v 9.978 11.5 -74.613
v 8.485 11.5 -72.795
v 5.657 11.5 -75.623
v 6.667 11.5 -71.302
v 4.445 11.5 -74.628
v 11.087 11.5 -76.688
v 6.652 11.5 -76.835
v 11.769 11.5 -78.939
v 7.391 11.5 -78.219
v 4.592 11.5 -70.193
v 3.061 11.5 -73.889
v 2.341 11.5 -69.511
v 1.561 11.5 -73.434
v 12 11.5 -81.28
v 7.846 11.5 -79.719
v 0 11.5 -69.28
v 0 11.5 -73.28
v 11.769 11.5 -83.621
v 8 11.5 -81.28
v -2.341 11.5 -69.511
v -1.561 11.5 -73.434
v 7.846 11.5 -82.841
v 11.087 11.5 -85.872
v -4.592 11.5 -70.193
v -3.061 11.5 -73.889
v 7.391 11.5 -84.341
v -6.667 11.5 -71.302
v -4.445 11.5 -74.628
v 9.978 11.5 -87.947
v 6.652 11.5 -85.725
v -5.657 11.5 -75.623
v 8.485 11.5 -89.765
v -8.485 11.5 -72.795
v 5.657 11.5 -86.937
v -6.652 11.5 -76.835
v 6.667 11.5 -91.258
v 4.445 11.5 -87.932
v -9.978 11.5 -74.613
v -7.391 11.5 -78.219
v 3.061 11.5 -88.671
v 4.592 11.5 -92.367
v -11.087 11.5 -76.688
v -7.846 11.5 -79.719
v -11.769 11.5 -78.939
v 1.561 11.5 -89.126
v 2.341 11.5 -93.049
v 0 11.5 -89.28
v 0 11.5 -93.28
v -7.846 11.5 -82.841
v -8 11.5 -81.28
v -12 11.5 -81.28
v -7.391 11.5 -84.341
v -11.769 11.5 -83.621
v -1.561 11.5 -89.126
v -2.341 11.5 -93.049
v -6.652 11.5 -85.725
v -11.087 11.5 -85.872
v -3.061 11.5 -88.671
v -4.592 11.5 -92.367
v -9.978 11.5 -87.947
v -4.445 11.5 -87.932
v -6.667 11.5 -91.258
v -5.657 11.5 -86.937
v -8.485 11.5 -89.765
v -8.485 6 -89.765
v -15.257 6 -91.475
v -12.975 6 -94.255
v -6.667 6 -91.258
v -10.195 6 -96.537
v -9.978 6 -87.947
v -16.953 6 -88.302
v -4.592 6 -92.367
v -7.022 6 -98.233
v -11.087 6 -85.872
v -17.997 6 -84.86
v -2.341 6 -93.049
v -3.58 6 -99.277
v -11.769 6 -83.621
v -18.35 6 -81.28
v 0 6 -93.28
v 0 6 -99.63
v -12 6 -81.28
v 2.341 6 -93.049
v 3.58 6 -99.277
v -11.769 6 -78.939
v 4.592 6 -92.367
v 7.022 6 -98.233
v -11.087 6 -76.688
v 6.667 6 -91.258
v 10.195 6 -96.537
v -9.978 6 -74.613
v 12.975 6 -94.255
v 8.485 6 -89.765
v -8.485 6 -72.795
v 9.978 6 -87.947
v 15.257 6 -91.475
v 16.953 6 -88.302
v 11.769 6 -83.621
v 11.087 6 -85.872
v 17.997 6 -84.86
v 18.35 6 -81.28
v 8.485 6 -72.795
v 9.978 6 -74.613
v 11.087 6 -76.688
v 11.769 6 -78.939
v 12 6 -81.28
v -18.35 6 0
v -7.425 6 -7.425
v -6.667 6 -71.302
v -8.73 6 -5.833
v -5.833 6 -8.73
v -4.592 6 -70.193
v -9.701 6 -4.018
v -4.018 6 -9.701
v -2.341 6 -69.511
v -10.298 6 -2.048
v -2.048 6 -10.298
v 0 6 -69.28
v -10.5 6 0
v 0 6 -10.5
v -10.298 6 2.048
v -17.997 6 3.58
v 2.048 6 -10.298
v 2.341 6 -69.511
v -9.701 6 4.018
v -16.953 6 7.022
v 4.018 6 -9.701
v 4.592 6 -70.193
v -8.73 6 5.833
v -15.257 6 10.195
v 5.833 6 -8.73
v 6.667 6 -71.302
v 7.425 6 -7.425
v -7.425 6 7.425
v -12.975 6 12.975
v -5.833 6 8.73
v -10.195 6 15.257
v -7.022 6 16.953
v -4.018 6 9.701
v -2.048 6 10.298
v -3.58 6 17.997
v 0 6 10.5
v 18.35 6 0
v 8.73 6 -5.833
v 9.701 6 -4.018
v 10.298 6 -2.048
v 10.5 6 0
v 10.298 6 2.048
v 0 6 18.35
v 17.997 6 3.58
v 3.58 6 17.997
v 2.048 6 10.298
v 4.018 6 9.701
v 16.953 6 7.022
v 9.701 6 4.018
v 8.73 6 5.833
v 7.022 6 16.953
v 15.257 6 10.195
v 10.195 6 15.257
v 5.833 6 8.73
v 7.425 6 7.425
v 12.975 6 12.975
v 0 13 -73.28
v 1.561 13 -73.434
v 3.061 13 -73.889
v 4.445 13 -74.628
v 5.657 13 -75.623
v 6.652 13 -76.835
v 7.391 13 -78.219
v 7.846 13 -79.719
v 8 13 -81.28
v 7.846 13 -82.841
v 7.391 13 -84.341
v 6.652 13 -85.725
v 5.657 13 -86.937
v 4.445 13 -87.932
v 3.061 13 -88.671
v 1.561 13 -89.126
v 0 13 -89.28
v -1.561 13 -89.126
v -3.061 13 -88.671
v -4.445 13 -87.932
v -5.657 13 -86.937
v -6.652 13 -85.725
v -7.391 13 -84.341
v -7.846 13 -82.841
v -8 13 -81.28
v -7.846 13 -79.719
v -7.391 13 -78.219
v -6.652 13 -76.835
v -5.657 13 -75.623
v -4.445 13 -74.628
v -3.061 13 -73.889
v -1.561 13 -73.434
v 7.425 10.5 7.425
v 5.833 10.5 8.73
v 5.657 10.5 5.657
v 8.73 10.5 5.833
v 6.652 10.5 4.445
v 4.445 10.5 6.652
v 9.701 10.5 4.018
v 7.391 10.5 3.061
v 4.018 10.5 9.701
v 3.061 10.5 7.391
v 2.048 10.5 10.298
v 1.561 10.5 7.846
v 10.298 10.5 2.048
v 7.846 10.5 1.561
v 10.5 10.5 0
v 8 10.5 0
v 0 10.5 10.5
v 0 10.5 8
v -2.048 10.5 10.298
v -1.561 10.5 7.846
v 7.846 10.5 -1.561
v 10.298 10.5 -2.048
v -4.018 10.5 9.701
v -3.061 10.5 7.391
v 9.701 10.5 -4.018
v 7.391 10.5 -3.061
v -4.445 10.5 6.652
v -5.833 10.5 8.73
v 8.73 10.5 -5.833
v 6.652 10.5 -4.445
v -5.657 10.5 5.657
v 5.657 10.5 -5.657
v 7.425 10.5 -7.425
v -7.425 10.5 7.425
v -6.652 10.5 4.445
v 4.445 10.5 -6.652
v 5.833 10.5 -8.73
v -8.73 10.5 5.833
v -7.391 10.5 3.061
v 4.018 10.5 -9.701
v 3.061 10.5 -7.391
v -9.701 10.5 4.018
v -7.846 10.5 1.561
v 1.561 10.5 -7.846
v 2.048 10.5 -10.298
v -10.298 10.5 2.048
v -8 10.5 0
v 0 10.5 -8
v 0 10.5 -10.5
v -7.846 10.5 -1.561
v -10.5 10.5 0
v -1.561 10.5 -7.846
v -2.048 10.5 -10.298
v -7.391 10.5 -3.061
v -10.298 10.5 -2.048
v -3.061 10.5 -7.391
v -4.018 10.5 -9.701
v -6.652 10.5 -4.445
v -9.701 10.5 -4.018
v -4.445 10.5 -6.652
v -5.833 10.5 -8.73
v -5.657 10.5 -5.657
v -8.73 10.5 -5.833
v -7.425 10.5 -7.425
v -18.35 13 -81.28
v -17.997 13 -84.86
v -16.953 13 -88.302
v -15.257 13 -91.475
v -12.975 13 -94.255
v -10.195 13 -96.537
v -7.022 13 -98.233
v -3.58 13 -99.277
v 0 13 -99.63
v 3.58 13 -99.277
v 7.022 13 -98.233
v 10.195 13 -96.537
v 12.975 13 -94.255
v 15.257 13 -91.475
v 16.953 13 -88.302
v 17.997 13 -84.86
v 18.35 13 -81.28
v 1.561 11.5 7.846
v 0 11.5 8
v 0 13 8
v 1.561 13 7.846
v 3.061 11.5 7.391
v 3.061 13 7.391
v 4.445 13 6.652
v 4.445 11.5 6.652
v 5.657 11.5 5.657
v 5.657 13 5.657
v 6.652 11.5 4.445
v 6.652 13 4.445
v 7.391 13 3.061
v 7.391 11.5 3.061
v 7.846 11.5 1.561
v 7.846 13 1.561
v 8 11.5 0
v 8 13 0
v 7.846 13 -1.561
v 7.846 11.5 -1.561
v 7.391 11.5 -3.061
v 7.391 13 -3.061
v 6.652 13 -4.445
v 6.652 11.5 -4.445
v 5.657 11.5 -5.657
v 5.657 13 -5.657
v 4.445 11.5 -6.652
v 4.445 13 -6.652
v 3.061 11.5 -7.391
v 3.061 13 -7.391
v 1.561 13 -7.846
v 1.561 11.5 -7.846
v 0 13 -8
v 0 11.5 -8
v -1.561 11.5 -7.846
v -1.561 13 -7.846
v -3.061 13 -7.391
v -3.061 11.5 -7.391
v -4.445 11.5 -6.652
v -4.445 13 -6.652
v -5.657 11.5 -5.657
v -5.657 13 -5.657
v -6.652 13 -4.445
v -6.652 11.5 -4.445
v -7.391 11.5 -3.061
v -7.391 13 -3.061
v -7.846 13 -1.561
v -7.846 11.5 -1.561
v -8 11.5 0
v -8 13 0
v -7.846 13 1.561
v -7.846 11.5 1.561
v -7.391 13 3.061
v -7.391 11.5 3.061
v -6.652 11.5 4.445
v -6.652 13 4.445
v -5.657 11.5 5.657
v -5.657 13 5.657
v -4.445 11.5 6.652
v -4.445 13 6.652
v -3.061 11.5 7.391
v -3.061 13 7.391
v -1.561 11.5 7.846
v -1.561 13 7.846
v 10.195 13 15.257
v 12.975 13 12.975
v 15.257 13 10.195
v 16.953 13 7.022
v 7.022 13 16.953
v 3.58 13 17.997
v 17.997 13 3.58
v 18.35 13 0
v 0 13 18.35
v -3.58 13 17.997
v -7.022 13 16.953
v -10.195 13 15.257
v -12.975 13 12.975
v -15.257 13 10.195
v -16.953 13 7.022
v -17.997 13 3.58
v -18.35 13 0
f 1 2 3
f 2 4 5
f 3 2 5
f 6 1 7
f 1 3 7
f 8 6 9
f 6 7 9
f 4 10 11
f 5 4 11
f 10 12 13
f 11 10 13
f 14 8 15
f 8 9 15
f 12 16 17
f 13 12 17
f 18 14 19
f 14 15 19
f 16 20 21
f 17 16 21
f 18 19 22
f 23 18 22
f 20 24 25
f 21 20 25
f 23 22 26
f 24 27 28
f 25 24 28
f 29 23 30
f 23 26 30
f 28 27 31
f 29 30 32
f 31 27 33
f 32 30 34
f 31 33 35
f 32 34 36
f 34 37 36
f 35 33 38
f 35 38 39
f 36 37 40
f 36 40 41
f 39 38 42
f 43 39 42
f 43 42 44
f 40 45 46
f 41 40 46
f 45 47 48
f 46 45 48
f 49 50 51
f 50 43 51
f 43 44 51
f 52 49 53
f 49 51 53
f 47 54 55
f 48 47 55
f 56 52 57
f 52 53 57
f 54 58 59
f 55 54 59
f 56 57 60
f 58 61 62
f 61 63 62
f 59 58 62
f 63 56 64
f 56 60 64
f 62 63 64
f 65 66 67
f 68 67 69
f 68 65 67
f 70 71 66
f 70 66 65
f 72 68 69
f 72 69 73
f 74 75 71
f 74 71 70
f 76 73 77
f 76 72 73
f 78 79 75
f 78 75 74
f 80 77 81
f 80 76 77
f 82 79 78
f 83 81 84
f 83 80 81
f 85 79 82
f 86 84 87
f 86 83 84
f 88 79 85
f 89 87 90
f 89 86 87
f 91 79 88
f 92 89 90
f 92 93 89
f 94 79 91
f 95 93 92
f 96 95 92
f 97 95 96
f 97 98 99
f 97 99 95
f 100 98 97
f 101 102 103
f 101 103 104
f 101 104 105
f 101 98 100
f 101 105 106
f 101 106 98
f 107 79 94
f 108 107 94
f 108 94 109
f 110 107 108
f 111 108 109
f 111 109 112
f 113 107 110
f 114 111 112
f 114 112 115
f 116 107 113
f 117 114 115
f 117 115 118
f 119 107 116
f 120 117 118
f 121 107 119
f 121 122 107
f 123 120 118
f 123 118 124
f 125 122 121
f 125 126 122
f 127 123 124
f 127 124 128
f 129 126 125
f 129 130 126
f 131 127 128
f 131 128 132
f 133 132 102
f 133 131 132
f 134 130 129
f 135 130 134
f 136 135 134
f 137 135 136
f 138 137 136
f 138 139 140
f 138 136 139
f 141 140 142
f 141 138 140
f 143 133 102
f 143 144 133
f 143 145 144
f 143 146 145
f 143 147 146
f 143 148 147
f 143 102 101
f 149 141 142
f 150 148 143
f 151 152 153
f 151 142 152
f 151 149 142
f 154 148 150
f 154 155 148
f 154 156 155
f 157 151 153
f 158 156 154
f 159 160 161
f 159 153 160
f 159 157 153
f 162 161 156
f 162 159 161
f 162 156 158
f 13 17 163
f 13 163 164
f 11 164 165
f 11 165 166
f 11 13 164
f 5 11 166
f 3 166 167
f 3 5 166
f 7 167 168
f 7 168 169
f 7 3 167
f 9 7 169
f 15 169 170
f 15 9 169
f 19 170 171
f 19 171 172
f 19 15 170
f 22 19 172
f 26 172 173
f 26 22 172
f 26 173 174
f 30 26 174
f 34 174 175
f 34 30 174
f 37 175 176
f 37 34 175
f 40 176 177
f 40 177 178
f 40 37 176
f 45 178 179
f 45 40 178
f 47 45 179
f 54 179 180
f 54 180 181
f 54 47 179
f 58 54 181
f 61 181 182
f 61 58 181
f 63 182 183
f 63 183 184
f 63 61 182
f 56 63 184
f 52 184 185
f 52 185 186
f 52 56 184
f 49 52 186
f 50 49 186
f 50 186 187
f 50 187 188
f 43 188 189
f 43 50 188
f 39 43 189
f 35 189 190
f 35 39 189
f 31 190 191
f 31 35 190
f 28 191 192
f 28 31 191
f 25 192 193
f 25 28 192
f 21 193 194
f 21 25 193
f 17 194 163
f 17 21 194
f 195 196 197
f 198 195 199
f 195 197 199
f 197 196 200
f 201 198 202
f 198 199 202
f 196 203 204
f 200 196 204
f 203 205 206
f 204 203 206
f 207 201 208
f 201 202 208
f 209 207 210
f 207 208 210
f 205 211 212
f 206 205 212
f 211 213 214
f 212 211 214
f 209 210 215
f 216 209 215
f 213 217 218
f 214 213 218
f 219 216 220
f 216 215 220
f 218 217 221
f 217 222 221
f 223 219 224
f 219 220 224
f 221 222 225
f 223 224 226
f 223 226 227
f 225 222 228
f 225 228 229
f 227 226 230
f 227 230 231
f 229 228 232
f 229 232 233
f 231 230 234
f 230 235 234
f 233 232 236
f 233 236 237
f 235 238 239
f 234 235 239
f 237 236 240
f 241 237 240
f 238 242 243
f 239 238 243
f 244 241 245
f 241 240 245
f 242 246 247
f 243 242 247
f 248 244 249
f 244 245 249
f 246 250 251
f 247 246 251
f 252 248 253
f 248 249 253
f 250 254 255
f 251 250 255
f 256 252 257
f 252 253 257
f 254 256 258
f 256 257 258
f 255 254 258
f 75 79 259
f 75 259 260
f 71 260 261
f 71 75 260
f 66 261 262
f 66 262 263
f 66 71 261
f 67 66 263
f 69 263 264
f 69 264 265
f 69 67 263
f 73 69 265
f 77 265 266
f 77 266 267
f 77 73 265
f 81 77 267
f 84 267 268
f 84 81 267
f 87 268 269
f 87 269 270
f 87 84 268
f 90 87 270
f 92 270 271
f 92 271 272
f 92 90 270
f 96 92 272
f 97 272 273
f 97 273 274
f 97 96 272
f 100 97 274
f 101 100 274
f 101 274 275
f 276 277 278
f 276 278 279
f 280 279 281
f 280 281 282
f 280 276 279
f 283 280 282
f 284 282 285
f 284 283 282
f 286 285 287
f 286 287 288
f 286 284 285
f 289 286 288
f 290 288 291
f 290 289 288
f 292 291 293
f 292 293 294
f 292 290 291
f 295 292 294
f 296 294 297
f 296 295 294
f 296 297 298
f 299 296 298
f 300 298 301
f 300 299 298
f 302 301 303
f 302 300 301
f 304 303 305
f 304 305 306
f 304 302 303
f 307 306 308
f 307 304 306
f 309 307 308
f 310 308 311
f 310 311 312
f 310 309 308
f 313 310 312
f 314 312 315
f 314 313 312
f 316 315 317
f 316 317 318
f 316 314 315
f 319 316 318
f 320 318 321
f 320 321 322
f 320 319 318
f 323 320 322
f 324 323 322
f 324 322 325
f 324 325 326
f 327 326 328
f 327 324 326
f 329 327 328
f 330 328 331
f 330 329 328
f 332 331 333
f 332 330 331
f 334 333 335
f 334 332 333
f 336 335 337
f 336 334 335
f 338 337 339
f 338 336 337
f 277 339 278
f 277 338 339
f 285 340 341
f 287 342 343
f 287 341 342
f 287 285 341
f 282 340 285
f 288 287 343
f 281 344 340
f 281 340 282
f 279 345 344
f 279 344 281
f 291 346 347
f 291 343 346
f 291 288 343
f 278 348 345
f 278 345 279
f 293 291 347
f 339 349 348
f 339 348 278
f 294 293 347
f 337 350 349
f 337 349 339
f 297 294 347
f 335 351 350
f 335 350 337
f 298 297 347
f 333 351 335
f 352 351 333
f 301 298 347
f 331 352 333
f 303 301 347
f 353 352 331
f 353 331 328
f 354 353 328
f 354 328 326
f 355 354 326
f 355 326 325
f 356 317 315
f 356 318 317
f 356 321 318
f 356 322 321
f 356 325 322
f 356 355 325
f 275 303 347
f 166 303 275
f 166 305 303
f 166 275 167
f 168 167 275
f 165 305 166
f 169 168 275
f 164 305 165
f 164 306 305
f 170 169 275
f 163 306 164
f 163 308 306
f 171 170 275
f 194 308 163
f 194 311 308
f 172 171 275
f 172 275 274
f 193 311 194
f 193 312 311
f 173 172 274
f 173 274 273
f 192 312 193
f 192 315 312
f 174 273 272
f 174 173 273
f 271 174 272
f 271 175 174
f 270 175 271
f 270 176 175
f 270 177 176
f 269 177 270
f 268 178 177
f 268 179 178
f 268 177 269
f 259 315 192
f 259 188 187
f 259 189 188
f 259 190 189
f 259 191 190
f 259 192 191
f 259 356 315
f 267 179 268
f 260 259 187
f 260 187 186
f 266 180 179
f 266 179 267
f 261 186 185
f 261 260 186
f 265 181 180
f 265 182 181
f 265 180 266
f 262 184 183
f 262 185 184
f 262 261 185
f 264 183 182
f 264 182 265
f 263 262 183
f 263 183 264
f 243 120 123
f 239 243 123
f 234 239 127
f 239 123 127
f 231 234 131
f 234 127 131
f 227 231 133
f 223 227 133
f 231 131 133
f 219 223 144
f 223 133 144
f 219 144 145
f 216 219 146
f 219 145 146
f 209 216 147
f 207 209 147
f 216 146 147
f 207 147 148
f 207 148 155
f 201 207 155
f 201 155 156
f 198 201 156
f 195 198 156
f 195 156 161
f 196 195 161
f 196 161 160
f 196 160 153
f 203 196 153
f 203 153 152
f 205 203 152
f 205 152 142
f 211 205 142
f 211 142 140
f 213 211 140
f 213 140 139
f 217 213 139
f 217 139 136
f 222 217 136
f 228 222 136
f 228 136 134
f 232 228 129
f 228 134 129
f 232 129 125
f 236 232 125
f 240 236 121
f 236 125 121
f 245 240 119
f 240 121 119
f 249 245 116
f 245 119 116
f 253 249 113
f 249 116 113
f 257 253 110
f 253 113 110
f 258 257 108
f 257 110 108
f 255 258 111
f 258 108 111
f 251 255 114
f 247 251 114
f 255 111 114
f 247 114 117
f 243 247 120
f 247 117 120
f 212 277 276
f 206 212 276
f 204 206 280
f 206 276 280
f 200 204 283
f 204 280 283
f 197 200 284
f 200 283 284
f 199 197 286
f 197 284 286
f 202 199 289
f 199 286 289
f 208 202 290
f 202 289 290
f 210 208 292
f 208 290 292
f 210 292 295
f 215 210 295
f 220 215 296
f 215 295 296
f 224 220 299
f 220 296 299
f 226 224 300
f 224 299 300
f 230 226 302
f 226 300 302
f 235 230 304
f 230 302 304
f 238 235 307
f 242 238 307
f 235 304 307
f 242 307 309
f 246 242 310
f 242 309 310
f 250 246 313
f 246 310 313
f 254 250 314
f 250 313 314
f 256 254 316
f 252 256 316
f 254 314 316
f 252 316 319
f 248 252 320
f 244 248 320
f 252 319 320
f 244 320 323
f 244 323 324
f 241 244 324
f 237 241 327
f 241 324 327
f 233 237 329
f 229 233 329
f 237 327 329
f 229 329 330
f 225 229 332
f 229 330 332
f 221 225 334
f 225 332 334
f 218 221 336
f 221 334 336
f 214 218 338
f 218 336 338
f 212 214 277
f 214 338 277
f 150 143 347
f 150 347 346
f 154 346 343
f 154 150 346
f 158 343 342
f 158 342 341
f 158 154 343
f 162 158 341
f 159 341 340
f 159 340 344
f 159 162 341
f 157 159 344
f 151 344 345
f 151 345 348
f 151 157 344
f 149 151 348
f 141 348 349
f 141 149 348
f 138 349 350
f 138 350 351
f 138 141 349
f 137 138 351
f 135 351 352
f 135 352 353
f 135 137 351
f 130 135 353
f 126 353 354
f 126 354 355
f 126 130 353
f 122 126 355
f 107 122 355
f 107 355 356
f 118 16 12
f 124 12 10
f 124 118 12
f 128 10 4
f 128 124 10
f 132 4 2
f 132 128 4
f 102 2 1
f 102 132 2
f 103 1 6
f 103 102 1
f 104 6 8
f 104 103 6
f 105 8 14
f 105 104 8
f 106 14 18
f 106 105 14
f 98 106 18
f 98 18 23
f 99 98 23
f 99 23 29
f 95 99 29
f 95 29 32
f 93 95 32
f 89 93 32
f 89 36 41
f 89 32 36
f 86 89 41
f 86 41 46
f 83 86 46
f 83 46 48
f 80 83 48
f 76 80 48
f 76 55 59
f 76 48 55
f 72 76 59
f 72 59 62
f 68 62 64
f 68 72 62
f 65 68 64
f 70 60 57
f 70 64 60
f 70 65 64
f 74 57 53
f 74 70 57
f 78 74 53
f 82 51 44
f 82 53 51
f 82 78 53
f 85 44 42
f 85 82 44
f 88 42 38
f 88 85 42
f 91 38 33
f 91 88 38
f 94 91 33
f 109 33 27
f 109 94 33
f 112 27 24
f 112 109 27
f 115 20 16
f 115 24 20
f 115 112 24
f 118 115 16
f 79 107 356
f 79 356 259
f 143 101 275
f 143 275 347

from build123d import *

# Parameters (mm, degrees)
SKETCH1_R           = 12.000000003
BOSS_EXTRUDE1_DEPTH = 13
SKETCH2_R           = 12.000000003
CUT_EXTRUDE1_DEPTH  = 6
BOSS_EXTRUDE2_START = -1.5
SKETCH3_R           = 12.000000003
SKETCH3_R_2         = 8
BOSS_EXTRUDE2_DEPTH = 1.5
SKETCH4_W           = 40.64
SKETCH4_H           = 6
CUT_EXTRUDE2_DEPTH  = 107.967410462
BOSS_EXTRUDE3_START = 5.499999908
SKETCH6_R           = 12.000000003
SKETCH6_R_2         = 10.5
BOSS_EXTRUDE3_DEPTH = 5.499999908
MOVE_FACE3_BY       = 1.000000032


with BuildPart() as part:
    # Sketch1 → Boss-Extrude1 (new body)
    with BuildSketch(Plane(origin=(0, 0, 0), x_dir=(1, 0, 0), z_dir=(0, 1, 0))):
        with BuildLine():
            Line((-18.350000003, 0), (-18.350000003, 81.28))
            ThreePointArc((-18.350000003, 81.28), (0, 99.630000003), (18.350000003, 81.28))
            Line((18.350000003, 81.28), (18.350000003, 0))
            ThreePointArc((18.350000003, 0), (0, -18.350000003), (-18.350000003, 0))
        make_face()
        with Locations(Location((0, 0, 0), (0, 0, 270))):
            Circle(SKETCH1_R, mode=Mode.SUBTRACT)
        with Locations(Location((0, 81.28, 0), (0, 0, 270))):
            Circle(SKETCH1_R, mode=Mode.SUBTRACT)
    extrude(amount=BOSS_EXTRUDE1_DEPTH)

    # Sketch2 → Cut-Extrude1 (cut)
    # profile 1 of 2: a face of its own
    with BuildSketch(Plane.XZ):
        with BuildLine():
            Line((-18.350000003, -60.96), (-18.350000003, -81.28))
            ThreePointArc((-18.350000003, -81.28), (0, -99.630000003), (18.350000003, -81.28))
            Line((18.350000003, -81.28), (18.350000003, -60.96))
            Line((18.350000003, -60.96), (-18.350000003, -60.96))
        make_face()
        with Locations(Location((0, -81.28, 0), (0, 0, 270))):
            Circle(SKETCH2_R, mode=Mode.SUBTRACT)
    # profile 2 of 2: a face of its own
    with BuildSketch(Plane.XZ):
        with BuildLine():
            ThreePointArc((18.350000003, 0), (0, 18.350000003), (-18.350000003, 0))
            Line((-18.350000003, 0), (-18.350000003, -20.32))
            Line((-18.350000003, -20.32), (18.350000003, -20.32))
            Line((18.350000003, -20.32), (18.350000003, 0))
        make_face()
    extrude(amount=-CUT_EXTRUDE1_DEPTH, mode=Mode.SUBTRACT)

    # Sketch3 → Boss-Extrude2 (add)
    # profile 1 of 2: a face of its own
    with BuildSketch(Plane(origin=(0, 12.999999908, 0), x_dir=(1, 0, 0), z_dir=(0, 1, 0)).offset(BOSS_EXTRUDE2_START)):
        with Locations(Location((0, 81.28, 0), (0, 0, 90))):
            Circle(SKETCH3_R)
        with Locations(Location((0, 81.28, 0), (0, 0, 270))):
            Circle(SKETCH3_R_2, mode=Mode.SUBTRACT)
    # profile 2 of 2: a face of its own
    with BuildSketch(Plane(origin=(0, 12.999999908, 0), x_dir=(1, 0, 0), z_dir=(0, 1, 0)).offset(BOSS_EXTRUDE2_START)):
        with Locations(Location((0, 0, 0), (0, 0, 90))):
            Circle(SKETCH3_R)
        with Locations(Location((0, 0, 0), (0, 0, 270))):
            Circle(SKETCH3_R_2, mode=Mode.SUBTRACT)
    extrude(amount=BOSS_EXTRUDE2_DEPTH)

    # Sketch4 → Cut-Extrude2 (cut, through all)
    with BuildSketch(Plane.ZY.offset(18.350000003)):
        with Locations((-40.64, 3)):
            Rectangle(SKETCH4_W, SKETCH4_H)
    extrude(amount=-CUT_EXTRUDE2_DEPTH, mode=Mode.SUBTRACT)

    # Sketch6 → Boss-Extrude3 (add)
    with BuildSketch(Plane.XZ.offset(-11.499999908).offset(BOSS_EXTRUDE3_START)):
        Circle(SKETCH6_R)
        with Locations(Location((0, 0, 0), (0, 0, 270))):
            Circle(SKETCH6_R_2, mode=Mode.SUBTRACT)
    extrude(amount=-BOSS_EXTRUDE3_DEPTH)

    # Move Face3: a face moved outward by 1.0
    extrude(part.faces().sort_by_distance((0, 11.499999908, 8.4))[0], amount=MOVE_FACE3_BY, dir=(0, -1, 0))


solid = part.part
